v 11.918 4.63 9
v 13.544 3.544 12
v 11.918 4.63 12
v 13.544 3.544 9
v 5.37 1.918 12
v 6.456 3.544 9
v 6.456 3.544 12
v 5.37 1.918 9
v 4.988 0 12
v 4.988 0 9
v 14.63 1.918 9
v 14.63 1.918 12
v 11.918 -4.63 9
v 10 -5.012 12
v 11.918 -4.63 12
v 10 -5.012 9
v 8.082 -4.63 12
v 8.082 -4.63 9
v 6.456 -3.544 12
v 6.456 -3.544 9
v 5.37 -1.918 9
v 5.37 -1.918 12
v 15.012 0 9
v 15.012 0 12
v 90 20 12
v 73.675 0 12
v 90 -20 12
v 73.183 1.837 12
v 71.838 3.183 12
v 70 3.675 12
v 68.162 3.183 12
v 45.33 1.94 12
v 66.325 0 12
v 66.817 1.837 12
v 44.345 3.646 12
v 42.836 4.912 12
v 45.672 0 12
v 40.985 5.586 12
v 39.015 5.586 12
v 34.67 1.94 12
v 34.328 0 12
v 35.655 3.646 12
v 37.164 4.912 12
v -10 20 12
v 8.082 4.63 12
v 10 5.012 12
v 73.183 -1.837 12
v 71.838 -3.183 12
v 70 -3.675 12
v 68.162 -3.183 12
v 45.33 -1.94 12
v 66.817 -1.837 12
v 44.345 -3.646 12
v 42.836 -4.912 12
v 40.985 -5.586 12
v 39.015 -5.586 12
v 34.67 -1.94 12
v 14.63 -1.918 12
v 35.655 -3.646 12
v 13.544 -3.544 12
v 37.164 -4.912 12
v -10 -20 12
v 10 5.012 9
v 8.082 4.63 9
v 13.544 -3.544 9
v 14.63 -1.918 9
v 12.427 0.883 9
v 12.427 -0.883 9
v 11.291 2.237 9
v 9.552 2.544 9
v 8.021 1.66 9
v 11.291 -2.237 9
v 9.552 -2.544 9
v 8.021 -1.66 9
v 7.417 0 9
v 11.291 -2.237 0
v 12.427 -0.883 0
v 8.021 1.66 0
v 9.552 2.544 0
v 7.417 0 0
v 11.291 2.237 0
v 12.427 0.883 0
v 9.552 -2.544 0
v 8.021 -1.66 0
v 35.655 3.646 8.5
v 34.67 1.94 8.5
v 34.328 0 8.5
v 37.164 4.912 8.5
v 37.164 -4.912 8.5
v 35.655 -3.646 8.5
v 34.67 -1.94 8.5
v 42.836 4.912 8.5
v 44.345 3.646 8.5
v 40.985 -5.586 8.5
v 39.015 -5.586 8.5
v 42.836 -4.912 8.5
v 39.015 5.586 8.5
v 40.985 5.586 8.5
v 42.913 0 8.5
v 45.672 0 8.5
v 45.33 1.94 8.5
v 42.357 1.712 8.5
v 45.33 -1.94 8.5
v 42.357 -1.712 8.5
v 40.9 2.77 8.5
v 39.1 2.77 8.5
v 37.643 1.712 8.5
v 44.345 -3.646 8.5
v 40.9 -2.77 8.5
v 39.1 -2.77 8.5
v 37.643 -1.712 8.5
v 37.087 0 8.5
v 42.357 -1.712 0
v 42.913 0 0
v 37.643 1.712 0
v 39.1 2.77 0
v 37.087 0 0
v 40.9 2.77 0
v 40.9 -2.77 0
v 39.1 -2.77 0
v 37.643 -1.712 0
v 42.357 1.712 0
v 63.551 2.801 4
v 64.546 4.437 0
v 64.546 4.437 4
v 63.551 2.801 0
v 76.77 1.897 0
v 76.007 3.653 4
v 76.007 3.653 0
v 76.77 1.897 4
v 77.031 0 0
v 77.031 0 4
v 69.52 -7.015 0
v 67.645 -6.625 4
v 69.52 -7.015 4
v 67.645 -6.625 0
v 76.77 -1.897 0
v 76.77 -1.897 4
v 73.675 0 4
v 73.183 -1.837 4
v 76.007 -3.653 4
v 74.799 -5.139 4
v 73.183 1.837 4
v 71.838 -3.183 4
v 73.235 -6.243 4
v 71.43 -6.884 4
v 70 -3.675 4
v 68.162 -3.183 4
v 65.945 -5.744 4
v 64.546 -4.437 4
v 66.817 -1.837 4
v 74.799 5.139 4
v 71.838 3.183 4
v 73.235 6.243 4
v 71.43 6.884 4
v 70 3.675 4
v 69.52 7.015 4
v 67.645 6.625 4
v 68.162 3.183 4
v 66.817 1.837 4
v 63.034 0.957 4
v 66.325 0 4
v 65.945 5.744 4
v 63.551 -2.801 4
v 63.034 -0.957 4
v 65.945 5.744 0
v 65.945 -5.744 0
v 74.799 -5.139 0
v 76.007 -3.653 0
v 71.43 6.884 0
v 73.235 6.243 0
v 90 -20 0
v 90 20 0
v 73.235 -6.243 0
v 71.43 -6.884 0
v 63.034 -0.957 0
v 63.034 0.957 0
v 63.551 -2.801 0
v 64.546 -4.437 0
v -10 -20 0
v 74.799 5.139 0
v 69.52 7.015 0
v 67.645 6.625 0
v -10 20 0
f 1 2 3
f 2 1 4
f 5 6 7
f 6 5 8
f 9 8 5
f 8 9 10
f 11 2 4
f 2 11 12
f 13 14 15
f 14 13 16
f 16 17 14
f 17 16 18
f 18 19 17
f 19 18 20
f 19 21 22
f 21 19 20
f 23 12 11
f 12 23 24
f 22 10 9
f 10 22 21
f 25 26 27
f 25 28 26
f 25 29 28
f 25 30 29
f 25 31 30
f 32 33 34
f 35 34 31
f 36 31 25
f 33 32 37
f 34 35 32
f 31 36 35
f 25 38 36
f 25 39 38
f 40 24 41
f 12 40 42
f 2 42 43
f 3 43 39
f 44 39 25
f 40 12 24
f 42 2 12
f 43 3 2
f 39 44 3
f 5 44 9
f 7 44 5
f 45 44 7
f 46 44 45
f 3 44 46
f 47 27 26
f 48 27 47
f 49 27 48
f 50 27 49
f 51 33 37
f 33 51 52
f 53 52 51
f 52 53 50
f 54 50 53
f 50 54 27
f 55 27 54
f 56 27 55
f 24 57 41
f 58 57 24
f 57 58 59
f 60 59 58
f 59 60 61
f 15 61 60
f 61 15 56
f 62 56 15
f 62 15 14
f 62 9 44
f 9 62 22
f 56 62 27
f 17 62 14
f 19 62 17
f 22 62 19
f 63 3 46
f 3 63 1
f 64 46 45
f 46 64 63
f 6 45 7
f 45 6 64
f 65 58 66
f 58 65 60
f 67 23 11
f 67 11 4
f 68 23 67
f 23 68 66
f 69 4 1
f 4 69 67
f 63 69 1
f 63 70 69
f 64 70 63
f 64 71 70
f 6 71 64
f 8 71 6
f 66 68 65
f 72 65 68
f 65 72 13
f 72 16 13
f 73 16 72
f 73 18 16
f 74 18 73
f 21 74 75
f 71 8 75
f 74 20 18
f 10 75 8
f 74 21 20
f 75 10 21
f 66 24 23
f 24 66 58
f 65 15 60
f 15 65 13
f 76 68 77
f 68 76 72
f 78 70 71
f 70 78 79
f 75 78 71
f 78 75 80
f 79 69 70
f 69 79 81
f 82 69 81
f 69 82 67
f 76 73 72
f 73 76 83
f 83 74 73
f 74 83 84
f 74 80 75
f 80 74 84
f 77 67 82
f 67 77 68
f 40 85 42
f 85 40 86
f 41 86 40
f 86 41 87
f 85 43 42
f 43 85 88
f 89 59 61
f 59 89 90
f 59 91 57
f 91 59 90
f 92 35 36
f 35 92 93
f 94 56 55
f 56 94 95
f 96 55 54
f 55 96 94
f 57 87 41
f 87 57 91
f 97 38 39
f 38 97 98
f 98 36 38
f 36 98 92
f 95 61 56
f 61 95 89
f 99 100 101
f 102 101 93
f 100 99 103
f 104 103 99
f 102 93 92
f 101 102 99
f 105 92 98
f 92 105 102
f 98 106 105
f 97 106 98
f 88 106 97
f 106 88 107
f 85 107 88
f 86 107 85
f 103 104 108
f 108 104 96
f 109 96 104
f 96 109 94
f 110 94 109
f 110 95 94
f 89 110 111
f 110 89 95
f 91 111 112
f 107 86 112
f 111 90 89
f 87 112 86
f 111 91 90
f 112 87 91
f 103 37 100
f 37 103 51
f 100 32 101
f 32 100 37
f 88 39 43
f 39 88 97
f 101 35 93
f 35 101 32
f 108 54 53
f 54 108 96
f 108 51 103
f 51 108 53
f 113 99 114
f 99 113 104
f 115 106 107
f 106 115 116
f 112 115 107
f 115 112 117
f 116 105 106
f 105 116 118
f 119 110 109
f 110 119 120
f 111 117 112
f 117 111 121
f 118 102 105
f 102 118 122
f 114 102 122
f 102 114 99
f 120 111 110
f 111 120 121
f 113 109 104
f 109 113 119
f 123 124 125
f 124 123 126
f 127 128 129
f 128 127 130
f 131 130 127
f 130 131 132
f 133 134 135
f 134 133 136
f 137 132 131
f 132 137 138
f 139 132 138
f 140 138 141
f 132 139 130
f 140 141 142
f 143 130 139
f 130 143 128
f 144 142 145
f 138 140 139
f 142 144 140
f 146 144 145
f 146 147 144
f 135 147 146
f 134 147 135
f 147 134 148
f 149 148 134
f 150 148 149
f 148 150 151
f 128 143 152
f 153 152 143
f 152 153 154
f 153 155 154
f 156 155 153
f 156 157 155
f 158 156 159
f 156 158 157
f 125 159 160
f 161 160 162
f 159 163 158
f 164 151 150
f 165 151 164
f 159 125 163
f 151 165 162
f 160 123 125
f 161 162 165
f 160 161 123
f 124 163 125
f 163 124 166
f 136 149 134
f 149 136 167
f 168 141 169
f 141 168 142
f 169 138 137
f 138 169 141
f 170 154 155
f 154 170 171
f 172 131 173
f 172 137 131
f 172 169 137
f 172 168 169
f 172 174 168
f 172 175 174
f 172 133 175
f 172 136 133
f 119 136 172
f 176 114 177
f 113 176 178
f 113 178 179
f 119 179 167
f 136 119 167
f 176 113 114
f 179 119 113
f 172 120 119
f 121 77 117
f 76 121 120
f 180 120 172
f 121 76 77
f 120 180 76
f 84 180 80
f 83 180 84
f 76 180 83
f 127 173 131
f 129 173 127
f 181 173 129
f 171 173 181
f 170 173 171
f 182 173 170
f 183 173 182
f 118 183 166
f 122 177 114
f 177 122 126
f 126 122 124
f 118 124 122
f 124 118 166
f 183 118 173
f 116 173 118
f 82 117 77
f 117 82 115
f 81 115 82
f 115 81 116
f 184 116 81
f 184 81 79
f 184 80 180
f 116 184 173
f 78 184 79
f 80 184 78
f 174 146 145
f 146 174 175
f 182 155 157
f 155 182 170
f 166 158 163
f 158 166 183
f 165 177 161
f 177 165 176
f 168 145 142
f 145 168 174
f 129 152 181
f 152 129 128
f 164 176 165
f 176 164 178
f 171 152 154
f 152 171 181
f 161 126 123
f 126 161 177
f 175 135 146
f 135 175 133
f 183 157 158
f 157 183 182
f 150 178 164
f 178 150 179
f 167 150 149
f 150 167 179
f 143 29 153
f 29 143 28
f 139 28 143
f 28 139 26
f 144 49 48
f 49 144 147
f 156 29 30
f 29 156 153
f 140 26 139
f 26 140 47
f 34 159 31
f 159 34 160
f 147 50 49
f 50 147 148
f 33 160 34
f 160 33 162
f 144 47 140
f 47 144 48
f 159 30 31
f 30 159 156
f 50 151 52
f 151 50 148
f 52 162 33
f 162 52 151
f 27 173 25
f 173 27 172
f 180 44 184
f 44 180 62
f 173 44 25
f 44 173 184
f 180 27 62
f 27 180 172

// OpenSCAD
// =====================================================
// CALCULADORA DE AVELLANADO - TORNILLOS AMERICANOS
// (Flat Head Wood Screws, numeración ANSI/ASME B18.6.1)
// El diámetro de rosca se ingresa como N° de calibre
// USA (Wood Screw Gauge) o en pulgadas decimales
// Versión cilindro recto - DEMO 3D
// =====================================================
// NOTA: los tornillos de madera americanos se especifican
// por NÚMERO DE CALIBRE (#4, #6, #8, #10, #12) y no por
// diámetro directo como en métrico. A partir de 1/4" ya
// se especifican en pulgadas normales.
// Valores de cabeza (DK, K) tomados de tablas de referencia
// de flat head wood screws - verificar contra fabricante
// si es para producción crítica.
// =====================================================

PULGADA_AM = 25.4;
function pulg_a_mm_am(p) = p * PULGADA_AM;

// -----------------------------------------------------
// Diámetro de vástago (shank) según N° de calibre USA
// (en pulgadas decimales)
// -----------------------------------------------------
function diametro_calibre(numero) =
    numero == 2  ? 0.086 :
    numero == 3  ? 0.099 :
    numero == 4  ? 0.112 :
    numero == 5  ? 0.125 :
    numero == 6  ? 0.138 :
    numero == 7  ? 0.151 :
    numero == 8  ? 0.164 :
    numero == 9  ? 0.177 :
    numero == 10 ? 0.190 :
    numero == 12 ? 0.216 :
    numero == 14 ? 0.242 :
    0.190; // default: N°10

// -----------------------------------------------------
// Función que calcula [DK, K] en mm según el diámetro
// de rosca en PULGADAS decimales (shank diameter)
// Acepta tanto el resultado de diametro_calibre() como
// una pulgada normal (1/4", 5/16", 3/8") directamente
// -----------------------------------------------------
function cabeza_tornillo_americano(D_pulg) =
    D_pulg <= 0.086 ? [pulg_a_mm_am(0.216), pulg_a_mm_am(0.062)] : // N°2
    D_pulg <= 0.099 ? [pulg_a_mm_am(0.242), pulg_a_mm_am(0.070)] : // N°3
    D_pulg <= 0.112 ? [pulg_a_mm_am(0.268), pulg_a_mm_am(0.079)] : // N°4
    D_pulg <= 0.125 ? [pulg_a_mm_am(0.295), pulg_a_mm_am(0.088)] : // N°5
    D_pulg <= 0.138 ? [pulg_a_mm_am(0.320), pulg_a_mm_am(0.096)] : // N°6
    D_pulg <= 0.151 ? [pulg_a_mm_am(0.345), pulg_a_mm_am(0.104)] : // N°7
    D_pulg <= 0.164 ? [pulg_a_mm_am(0.371), pulg_a_mm_am(0.112)] : // N°8
    D_pulg <= 0.177 ? [pulg_a_mm_am(0.397), pulg_a_mm_am(0.120)] : // N°9
    D_pulg <= 0.190 ? [pulg_a_mm_am(0.423), pulg_a_mm_am(0.128)] : // N°10
    D_pulg <= 0.216 ? [pulg_a_mm_am(0.475), pulg_a_mm_am(0.144)] : // N°12
    D_pulg <= 0.242 ? [pulg_a_mm_am(0.507), pulg_a_mm_am(0.153)] : // N°14
    D_pulg <= 0.250 ? [pulg_a_mm_am(0.530), pulg_a_mm_am(0.160)] : // 1/4"
    D_pulg <= 0.3125? [pulg_a_mm_am(0.650), pulg_a_mm_am(0.195)] : // 5/16"
    D_pulg <= 0.375 ? [pulg_a_mm_am(0.770), pulg_a_mm_am(0.230)] : // 3/8"
    [pulg_a_mm_am(D_pulg) * 1.9, pulg_a_mm_am(D_pulg) * 0.55];     // fórmula general

// =====================================================
// MÓDULO SIMPLIFICADO - CILINDRO RECTO
// diametro_rosca_pulg: diámetro de vástago en pulgadas
// (usar diametro_calibre(N) para tornillos por número)
// =====================================================
module avellanado_cilindrico_americano(
    diametro_rosca_pulg,
    profundidad_avellano,
    holgura = 0.3,
    altura_extra = 0,        // Altura adicional del avellanado en mm
    offset_z = 0             // Desplazamiento vertical en mm (default 0)
) {
    datos = cabeza_tornillo_americano(diametro_rosca_pulg);
    diametro_cabeza = datos[0];
    altura_total = profundidad_avellano + altura_extra;

    translate([0, 0, offset_z])
        cylinder(h = altura_total,
                 r = (diametro_cabeza/2) + holgura);
}

// =====================================================
// MÓDULO PARA AGUJERO PASANTE (solo diámetro)
// =====================================================
module agujero_pasante_americano(
    diametro_rosca_pulg,
    profundidad,
    profundidad_avellano = 0,
    holgura = 0.5,
    profundidad_abs = true,
    altura_extra = 0,        // Altura adicional del agujero en mm
    offset_z = 0             // Desplazamiento vertical en mm (default 0)
) {
    diametro_rosca_mm = pulg_a_mm_am(diametro_rosca_pulg);

    if (profundidad_abs)
        translate([0, 0, profundidad_avellano + offset_z])
            cylinder(h = profundidad - profundidad_avellano + altura_extra,
                     r = (diametro_rosca_mm/2) + holgura);
    else
        translate([0, 0, profundidad_avellano + offset_z])
            cylinder(h = profundidad + altura_extra,
                     r = (diametro_rosca_mm/2) + holgura);
}

// =====================================================
// MÓDULO COMBINADO - AVELLANADO + AGUJERO PASANTE
// =====================================================
module agujero_con_avellanado_americano(
    diametro_rosca_pulg,
    profundidad_avellano,
    profundidad_pieza,
    holgura_avellano = 0.3,
    holgura_pasante = 0.5,
    profundidad_abs = true,
    altura_extra = 0,        // Altura adicional del avellanado en mm
    offset_z = 0,            // Desplazamiento vertical en mm (default 0)
    altura_extra_pasante = 0,// Altura adicional del agujero en mm
    offset_z_pasante = 0     // Desplazamiento vertical del agujero en mm (default 0)
) {
    avellanado_cilindrico_americano(
        diametro_rosca_pulg = diametro_rosca_pulg,
        profundidad_avellano = profundidad_avellano,
        holgura = holgura_avellano,
        altura_extra = altura_extra,
        offset_z = offset_z
    );

    agujero_pasante_americano(
        diametro_rosca_pulg = diametro_rosca_pulg,
        profundidad = profundidad_pieza,
        profundidad_avellano = profundidad_avellano,
        holgura = holgura_pasante,
        profundidad_abs = profundidad_abs,
        altura_extra = altura_extra_pasante,
        offset_z = offset_z_pasante
    );
}

// Funciones de utilidad
function diametro_cabeza_americano(D_pulg) = cabeza_tornillo_americano(D_pulg)[0];
function altura_cabeza_americano(D_pulg) = cabeza_tornillo_americano(D_pulg)[1];

// =====================================================
// DEMO 3D: placa con 3 avellanados de distinto calibre
// margen de corte para evitar z-fighting en el booleano
// =====================================================
margen_corte_am = 0.5;
espesor_placa_am = 12;   // mm - grosor de la placa demo
ancho_placa_am   = 100;
largo_placa_am   = 40;

module placa_demo_americana() {
    difference() {
        // Placa base
        translate([-10, -largo_placa_am/2, 0])
            cube([ancho_placa_am, largo_placa_am, espesor_placa_am]);

        // Tornillo N°8, entra por la cara superior
        translate([10, 0, espesor_placa_am])
            rotate([0, 180, 0])
                agujero_con_avellanado_americano(
                    diametro_rosca_pulg = diametro_calibre(8),
                    profundidad_avellano = 3.0,
                    profundidad_pieza = espesor_placa_am + margen_corte_am
                );

        // Tornillo N°10, entra por la cara superior
        translate([40, 0, espesor_placa_am])
            rotate([0, 180, 0])
                agujero_con_avellanado_americano(
                    diametro_rosca_pulg = diametro_calibre(10),
                    profundidad_avellano = 3.5,
                    profundidad_pieza = espesor_placa_am + margen_corte_am
                );

        // Tornillo 1/4", entra por la cara inferior
        // (demuestra profundidad_abs = false)
        translate([70, 0, 0])
            agujero_con_avellanado_americano(
                diametro_rosca_pulg = 0.25,
                profundidad_avellano = 4.0,
                profundidad_pieza = espesor_placa_am + margen_corte_am,
                profundidad_abs = false
            );
    }
}

placa_demo_americana();
